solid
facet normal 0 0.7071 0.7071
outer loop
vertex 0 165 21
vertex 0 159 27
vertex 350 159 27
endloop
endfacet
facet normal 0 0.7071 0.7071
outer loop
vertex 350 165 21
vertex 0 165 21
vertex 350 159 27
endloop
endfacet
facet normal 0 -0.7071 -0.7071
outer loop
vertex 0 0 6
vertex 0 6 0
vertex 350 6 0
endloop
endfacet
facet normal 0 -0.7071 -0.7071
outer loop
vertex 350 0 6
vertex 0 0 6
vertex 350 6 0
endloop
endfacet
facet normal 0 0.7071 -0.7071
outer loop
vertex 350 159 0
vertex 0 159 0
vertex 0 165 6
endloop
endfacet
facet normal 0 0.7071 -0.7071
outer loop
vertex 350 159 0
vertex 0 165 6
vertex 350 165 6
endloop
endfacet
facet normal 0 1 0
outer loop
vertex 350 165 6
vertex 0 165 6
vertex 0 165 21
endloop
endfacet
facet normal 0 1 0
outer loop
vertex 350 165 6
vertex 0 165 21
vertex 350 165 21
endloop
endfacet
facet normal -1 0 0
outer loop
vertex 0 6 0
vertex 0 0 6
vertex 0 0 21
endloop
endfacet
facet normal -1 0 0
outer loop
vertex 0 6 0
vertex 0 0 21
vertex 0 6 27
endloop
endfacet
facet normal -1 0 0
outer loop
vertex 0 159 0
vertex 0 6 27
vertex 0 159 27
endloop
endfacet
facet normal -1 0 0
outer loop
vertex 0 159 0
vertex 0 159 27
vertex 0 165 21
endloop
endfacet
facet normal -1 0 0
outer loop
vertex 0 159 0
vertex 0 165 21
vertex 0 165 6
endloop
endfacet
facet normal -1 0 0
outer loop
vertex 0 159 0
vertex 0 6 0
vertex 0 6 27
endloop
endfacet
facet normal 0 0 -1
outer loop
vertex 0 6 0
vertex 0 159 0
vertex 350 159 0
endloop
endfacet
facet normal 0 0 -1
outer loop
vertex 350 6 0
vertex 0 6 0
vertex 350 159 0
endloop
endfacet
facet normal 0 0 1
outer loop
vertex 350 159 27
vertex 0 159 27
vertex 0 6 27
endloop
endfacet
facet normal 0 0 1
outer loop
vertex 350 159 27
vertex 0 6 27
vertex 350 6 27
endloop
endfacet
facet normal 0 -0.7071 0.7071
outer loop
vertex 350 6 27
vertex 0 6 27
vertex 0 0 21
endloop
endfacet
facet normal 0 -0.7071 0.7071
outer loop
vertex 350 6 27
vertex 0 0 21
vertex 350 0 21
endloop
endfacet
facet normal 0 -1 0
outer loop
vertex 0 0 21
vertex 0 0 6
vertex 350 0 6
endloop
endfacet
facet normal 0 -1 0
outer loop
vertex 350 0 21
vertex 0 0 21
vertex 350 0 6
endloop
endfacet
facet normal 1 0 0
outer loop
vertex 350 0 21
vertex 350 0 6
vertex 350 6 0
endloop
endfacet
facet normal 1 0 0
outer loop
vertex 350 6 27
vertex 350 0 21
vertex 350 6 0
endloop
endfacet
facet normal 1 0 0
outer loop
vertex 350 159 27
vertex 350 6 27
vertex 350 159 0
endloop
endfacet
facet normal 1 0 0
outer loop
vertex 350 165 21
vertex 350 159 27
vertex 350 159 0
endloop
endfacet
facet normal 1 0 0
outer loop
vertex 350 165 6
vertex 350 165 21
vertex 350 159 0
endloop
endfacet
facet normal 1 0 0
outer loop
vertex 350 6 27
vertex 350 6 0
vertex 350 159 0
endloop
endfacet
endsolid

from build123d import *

# Parameters (mm, degrees)
ESQUISSE1_W        = 350
ESQUISSE1_H        = 165
BOSS_EXTRU_1_DEPTH = 27
CHANFREIN1_SIZE    = 6


with BuildPart() as part:
    # Esquisse1 → Boss.-Extru.1 (new body)
    with BuildSketch(Plane.XY):
        with Locations((175, 82.5)):
            Rectangle(ESQUISSE1_W, ESQUISSE1_H)
    extrude(amount=BOSS_EXTRU_1_DEPTH)

    # Chanfrein1
    chanfrein1_edges = [part.edges().sort_by_distance(p)[0] for p in [
        (175, 165, 27),
        (175, 165, 0),
        (175, 0, 0),
        (175, 0, 27),
    ]]
    chamfer(chanfrein1_edges, length=CHANFREIN1_SIZE)


solid = part.part
